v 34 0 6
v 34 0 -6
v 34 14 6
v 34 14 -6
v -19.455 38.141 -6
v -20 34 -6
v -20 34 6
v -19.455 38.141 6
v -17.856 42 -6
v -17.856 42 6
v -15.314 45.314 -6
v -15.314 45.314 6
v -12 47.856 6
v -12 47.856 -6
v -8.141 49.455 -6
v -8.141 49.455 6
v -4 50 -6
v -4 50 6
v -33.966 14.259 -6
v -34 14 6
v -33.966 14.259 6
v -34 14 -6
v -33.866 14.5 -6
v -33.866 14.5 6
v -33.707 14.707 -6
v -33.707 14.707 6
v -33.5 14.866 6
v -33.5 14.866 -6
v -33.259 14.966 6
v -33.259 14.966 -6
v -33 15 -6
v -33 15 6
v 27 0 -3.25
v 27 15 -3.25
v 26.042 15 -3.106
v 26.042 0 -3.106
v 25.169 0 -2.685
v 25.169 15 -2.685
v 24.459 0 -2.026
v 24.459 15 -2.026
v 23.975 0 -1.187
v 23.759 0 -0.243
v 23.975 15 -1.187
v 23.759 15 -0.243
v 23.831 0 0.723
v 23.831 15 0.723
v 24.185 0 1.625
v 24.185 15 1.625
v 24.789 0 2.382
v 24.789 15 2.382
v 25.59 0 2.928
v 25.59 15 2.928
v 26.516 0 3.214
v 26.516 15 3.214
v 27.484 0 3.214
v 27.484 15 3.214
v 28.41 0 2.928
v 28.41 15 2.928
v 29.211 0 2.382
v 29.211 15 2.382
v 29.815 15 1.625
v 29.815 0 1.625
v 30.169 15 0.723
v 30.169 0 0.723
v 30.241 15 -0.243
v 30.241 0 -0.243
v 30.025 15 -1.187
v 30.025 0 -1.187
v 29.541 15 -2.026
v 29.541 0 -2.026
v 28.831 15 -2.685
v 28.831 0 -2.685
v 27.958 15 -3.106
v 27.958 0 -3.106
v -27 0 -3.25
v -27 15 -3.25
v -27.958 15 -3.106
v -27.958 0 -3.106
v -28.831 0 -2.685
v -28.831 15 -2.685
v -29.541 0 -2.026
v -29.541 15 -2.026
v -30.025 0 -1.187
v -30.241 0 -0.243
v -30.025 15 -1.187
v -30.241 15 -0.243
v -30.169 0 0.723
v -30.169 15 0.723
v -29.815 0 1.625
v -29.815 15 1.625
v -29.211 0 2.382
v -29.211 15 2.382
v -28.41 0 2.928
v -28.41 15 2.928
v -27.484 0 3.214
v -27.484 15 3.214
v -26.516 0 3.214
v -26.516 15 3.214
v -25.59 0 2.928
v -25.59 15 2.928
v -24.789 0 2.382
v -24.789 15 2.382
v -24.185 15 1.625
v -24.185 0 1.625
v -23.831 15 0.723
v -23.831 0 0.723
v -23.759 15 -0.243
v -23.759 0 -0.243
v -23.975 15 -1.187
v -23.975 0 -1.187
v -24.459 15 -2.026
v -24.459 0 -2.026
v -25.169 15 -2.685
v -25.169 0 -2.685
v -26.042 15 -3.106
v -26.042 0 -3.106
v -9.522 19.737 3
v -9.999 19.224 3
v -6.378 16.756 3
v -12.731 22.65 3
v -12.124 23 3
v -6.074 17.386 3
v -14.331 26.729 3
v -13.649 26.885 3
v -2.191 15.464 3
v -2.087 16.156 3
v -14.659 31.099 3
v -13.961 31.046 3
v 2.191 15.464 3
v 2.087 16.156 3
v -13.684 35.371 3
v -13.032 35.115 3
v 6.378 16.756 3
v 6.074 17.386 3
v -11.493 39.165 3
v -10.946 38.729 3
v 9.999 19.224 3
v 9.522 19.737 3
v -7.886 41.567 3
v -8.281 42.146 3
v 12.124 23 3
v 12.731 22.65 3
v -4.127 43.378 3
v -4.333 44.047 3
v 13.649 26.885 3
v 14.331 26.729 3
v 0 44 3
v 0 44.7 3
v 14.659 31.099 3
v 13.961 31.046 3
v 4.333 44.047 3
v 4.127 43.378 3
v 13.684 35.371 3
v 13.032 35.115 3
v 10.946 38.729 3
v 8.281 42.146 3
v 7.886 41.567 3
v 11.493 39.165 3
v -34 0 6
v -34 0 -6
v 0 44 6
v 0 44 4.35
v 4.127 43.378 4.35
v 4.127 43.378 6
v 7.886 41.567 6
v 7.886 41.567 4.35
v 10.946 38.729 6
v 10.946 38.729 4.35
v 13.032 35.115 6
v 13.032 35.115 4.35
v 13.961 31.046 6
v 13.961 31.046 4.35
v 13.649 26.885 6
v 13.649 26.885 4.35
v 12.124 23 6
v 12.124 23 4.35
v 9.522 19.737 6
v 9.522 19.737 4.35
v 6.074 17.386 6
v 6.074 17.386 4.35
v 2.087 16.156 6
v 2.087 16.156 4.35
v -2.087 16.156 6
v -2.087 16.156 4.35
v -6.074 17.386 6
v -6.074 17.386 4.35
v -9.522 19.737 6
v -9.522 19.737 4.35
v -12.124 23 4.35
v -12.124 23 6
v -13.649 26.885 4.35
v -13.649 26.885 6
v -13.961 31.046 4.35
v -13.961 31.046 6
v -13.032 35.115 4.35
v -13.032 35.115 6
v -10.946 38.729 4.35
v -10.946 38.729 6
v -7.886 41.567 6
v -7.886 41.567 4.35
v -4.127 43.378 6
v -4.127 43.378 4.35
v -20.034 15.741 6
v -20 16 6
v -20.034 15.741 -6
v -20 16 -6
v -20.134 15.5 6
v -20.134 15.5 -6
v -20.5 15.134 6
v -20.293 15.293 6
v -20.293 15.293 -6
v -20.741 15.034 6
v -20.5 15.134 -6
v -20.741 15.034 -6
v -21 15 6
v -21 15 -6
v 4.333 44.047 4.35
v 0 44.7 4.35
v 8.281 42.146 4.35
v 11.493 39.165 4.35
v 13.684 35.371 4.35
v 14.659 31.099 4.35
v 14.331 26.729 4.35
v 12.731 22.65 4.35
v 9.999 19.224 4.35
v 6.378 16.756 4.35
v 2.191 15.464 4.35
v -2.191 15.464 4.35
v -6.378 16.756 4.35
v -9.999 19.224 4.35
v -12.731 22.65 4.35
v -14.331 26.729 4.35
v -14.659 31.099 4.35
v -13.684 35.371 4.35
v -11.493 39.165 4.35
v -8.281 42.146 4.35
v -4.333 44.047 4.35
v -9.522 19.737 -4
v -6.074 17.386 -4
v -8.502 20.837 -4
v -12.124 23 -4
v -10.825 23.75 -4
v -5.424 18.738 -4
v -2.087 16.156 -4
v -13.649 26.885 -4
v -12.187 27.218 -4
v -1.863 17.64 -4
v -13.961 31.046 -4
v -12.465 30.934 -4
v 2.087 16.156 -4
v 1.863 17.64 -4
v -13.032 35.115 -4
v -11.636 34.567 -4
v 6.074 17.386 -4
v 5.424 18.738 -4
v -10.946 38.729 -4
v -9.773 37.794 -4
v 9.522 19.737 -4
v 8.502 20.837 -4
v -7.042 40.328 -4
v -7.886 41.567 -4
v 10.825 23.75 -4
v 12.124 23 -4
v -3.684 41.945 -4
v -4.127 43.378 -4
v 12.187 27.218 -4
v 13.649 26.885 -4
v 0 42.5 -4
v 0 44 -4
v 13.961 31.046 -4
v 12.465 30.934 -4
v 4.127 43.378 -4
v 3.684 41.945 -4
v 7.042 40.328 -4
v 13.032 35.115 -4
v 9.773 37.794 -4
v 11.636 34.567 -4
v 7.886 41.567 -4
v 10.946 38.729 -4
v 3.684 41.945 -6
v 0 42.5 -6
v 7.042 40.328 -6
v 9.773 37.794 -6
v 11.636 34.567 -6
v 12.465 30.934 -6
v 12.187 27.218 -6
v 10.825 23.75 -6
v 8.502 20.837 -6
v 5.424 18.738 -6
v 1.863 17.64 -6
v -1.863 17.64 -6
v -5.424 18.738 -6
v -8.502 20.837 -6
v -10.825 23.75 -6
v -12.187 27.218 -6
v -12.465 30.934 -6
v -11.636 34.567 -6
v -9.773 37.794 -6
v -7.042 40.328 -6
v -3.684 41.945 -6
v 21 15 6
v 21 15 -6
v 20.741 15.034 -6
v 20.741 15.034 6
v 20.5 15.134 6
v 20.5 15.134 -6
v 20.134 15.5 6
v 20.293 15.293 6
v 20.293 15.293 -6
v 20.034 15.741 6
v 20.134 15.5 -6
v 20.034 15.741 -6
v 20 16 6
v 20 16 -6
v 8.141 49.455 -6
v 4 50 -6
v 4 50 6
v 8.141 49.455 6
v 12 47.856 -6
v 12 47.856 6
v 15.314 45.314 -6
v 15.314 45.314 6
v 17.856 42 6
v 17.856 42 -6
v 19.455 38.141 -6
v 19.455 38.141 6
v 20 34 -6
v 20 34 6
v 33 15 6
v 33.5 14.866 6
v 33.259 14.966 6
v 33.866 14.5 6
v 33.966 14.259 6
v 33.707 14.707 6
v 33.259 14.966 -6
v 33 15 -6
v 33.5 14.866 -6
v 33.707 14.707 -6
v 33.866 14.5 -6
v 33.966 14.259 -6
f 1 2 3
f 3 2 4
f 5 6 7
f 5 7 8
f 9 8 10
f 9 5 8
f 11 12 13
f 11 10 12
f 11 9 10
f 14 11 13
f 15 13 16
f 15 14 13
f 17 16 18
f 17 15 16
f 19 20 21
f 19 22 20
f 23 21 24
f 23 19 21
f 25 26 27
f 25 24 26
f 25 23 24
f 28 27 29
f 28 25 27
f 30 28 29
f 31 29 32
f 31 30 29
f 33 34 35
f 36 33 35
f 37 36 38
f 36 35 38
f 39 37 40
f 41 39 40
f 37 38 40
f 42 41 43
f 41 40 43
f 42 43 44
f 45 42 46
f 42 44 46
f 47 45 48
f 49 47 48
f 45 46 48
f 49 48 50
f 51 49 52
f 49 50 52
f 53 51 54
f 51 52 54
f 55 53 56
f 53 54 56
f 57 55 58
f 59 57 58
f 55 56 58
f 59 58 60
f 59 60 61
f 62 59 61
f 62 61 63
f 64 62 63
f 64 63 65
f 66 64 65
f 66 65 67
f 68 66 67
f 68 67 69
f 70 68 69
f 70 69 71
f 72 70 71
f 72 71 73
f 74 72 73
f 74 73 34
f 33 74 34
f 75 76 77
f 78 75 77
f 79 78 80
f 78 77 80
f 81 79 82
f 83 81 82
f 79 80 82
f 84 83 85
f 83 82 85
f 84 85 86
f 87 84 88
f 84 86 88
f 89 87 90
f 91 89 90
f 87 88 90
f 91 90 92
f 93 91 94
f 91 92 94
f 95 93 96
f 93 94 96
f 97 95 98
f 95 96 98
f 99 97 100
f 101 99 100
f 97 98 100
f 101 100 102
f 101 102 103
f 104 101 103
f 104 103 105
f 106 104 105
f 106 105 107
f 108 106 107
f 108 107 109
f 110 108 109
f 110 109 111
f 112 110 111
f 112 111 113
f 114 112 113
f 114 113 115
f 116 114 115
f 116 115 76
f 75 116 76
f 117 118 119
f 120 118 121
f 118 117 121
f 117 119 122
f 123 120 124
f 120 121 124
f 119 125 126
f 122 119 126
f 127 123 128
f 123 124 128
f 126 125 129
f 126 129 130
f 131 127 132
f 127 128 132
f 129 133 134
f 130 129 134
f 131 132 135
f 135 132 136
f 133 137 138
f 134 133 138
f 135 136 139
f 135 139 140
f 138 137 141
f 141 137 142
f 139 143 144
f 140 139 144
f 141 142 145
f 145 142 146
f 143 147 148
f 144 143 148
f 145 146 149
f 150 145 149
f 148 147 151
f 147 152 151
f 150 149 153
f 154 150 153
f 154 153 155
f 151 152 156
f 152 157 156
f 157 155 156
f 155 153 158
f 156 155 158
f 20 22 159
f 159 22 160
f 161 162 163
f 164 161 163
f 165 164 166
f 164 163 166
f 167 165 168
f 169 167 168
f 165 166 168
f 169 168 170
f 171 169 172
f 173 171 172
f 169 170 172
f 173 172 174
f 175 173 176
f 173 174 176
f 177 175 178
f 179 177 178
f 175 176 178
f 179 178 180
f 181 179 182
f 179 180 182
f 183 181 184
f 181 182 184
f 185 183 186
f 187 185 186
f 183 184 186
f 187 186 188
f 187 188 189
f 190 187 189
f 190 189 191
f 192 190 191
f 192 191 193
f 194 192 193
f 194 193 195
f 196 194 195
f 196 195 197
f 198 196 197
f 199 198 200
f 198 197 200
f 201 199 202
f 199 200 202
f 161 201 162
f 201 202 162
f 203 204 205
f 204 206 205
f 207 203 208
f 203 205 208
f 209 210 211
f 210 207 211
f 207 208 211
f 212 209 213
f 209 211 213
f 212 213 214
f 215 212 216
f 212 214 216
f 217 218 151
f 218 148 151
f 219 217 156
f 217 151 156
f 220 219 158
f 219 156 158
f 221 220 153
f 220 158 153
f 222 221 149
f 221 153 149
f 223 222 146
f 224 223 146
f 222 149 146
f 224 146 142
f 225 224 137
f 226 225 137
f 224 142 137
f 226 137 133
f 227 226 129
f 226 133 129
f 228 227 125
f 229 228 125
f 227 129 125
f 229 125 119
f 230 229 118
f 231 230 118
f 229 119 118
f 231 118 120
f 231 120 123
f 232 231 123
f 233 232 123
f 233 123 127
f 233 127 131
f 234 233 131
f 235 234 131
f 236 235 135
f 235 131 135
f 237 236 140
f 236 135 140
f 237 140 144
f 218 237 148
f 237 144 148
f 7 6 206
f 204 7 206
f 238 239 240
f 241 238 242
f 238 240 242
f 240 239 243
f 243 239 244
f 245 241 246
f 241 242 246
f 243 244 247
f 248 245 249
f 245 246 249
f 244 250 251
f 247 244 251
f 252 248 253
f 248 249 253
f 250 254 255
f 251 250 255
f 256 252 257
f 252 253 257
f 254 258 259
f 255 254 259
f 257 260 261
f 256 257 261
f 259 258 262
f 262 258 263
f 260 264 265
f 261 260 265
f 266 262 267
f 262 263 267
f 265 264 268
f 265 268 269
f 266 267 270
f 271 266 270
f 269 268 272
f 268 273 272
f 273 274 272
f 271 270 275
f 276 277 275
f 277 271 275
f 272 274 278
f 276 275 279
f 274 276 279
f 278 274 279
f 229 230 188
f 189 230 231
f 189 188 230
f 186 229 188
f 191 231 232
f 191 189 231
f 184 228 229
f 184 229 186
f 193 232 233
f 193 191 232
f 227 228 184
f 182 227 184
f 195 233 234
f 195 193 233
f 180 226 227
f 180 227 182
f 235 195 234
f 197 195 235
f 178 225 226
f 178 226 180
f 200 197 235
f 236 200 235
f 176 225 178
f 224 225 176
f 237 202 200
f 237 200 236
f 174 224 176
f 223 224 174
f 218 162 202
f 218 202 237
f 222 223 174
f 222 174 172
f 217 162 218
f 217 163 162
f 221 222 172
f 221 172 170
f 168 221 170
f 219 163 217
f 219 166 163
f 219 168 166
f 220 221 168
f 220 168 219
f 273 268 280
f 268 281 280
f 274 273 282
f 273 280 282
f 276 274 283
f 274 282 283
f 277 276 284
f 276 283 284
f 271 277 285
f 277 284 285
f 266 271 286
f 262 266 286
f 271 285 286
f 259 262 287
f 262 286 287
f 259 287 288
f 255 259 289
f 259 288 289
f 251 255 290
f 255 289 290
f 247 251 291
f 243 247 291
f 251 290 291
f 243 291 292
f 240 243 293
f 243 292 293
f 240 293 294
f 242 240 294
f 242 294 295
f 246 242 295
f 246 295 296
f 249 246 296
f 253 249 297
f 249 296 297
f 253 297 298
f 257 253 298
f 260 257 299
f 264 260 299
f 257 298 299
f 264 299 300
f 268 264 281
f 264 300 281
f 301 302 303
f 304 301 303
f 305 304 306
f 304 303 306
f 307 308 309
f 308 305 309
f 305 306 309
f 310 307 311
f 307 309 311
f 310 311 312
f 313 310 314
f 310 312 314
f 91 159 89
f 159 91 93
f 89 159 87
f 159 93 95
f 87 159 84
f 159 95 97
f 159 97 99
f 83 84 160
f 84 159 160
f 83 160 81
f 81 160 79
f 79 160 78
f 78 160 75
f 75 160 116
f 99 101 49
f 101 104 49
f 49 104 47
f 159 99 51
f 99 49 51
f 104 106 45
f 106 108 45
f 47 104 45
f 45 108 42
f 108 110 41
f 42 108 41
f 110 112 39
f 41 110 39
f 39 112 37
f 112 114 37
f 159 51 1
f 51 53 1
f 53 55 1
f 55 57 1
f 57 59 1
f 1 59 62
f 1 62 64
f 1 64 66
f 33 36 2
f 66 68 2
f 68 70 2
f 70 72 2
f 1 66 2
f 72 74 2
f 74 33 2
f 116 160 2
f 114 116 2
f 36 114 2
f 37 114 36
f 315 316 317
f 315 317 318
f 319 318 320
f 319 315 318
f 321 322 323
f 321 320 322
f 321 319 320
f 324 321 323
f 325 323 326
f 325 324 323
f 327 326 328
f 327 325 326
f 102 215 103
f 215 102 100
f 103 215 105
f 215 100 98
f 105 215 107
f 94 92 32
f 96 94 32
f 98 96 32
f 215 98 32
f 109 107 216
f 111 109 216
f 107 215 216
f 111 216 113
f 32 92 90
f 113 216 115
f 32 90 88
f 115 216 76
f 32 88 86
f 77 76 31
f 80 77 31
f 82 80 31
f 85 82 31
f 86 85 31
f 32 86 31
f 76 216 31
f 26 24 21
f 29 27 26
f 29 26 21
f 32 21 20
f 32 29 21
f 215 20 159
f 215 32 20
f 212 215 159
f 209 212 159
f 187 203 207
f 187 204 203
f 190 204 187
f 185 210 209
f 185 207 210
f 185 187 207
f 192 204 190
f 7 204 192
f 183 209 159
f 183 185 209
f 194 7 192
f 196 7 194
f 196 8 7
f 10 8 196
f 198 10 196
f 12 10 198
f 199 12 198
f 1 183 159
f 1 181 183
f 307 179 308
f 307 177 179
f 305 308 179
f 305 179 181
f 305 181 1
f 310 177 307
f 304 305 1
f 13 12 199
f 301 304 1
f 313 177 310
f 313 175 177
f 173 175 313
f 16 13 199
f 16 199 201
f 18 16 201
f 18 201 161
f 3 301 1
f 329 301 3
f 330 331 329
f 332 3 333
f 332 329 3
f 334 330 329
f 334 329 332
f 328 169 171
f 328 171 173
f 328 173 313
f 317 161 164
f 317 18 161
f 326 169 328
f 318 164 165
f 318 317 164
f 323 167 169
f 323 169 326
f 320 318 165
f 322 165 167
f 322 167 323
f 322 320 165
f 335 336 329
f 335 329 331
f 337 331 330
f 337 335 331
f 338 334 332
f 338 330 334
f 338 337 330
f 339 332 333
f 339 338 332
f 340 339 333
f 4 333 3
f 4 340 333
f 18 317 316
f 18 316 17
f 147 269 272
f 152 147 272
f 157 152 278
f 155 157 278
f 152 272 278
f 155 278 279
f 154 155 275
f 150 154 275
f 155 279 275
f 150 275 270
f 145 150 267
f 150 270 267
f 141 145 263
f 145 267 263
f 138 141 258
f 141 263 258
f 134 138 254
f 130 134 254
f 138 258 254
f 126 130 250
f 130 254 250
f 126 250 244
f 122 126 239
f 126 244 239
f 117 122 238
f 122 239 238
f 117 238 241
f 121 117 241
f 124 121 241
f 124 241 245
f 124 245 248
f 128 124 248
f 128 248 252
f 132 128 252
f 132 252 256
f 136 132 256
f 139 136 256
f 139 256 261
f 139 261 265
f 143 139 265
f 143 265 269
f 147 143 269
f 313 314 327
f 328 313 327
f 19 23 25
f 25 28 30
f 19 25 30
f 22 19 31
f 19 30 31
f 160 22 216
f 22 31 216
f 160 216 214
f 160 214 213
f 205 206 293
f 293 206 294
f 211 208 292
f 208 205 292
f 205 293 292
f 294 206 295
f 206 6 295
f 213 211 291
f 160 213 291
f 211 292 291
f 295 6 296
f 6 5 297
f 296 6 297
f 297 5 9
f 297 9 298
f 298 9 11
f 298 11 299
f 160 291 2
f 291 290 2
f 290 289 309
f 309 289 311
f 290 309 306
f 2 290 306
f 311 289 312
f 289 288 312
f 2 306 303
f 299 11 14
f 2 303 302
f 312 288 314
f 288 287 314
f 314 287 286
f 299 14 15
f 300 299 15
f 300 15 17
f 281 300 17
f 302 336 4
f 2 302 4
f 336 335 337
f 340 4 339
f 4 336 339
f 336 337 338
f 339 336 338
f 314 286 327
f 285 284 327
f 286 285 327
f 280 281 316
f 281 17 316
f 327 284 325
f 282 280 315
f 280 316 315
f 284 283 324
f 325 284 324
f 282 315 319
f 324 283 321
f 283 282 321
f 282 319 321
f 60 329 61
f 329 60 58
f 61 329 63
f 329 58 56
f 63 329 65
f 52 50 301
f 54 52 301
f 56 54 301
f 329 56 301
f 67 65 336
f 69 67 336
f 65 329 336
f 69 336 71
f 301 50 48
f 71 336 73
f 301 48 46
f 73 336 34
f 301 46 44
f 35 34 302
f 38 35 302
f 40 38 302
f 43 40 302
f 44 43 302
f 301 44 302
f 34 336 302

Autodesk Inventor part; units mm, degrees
sketch "Sketch_1" plane through (0, 0, 0) normal (0, 0, 1) x (1, 0, 0)
  line L0 (-34, 14) -> (-34, 0)
  line L1 (-34, 0) -> (34, 0)
  line L2 (34, 0) -> (34, 14)
  arc A0 (34, 14) -> (33, 15) centre (33, 14) ccw
  line L3 (33, 15) -> (21, 15)
  arc A1 (20, 16) -> (21, 15) centre (21, 16) ccw
  line L4 (20, 16) -> (20, 34)
  arc A2 (20, 34) -> (4, 50) centre (4, 34) ccw
  line L5 (4, 50) -> (-4, 50)
  arc A3 (-4, 50) -> (-20, 34) centre (-4, 34) ccw
  line L6 (-20, 34) -> (-20, 16)
  arc A4 (-21, 15) -> (-20, 16) centre (-21, 16) ccw
  line L7 (-21, 15) -> (-33, 15)
  arc A5 (-33, 15) -> (-34, 14) centre (-33, 14) ccw
extrude "Extrusion1" add sketch "Sketch_1" along normal mid plane 12
sketch "Sketch_2" plane through (0, 0, 0) normal (1, 0, 0) x (0, 0, -1)
  line L0 (6, 30) -> (-6, 30)
  line L1 (-6, 30) -> (-6, 44)
  line L2 (-6, 44) -> (-4.35, 44)
  line L3 (-4.35, 44) -> (-4.35, 44.7)
  line L4 (-4.35, 44.7) -> (-3, 44.7)
  line L5 (-3, 44.7) -> (-3, 44)
  line L6 (-3, 44) -> (4, 44)
  line L7 (4, 44) -> (4, 42.5)
  line L8 (4, 42.5) -> (6, 42.5)
  line L9 (6, 42.5) -> (6, 30)
  line L10 (6, 30) -> (-6, 30)
revolve "Revolution1" cut sketch "Sketch_2" angle 360 about axis through (0, 30, -6) along (0, 0, -1)
sketch "Sketch3" plane through (-34, 0, 6) normal (0, -1, 0) x (1, 0, 0)
  point P0 (61, -6)
hole "Hole1" at (27, 0, 0) direction (0, 1, 0) diameter 6.5 depth 15
pattern_linear "Rectangular Pattern1" count 2 spacing 54 along (-1, 0, 0) of "Hole1"
ref_plane "to_bearing_XY" through (0, 30, -4) normal (0, 0, 1) x (1, 0, 0)
ref_plane "to_bearing_YZ" through (0, 30, -4) normal (1, 0, 0) x (0, 1, 0)
ref_plane "to_bearing_ZX" through (0, 30, -4) normal (0, 1, 0) x (0, 0, 1)
ref_plane "to_snapring_XY" through (0, 30, 4.35) normal (0, 0, 1) x (1, 0, 0)
ref_plane "to_snapring_YZ" through (0, 30, 4.35) normal (1, 0, 0) x (0, 1, 0)
ref_plane "to_snapring_ZX" through (0, 30, 4.35) normal (0, 1, 0) x (0, 0, 1)
properties part number "C-BGHKA6902ZZ-30_b_b"
